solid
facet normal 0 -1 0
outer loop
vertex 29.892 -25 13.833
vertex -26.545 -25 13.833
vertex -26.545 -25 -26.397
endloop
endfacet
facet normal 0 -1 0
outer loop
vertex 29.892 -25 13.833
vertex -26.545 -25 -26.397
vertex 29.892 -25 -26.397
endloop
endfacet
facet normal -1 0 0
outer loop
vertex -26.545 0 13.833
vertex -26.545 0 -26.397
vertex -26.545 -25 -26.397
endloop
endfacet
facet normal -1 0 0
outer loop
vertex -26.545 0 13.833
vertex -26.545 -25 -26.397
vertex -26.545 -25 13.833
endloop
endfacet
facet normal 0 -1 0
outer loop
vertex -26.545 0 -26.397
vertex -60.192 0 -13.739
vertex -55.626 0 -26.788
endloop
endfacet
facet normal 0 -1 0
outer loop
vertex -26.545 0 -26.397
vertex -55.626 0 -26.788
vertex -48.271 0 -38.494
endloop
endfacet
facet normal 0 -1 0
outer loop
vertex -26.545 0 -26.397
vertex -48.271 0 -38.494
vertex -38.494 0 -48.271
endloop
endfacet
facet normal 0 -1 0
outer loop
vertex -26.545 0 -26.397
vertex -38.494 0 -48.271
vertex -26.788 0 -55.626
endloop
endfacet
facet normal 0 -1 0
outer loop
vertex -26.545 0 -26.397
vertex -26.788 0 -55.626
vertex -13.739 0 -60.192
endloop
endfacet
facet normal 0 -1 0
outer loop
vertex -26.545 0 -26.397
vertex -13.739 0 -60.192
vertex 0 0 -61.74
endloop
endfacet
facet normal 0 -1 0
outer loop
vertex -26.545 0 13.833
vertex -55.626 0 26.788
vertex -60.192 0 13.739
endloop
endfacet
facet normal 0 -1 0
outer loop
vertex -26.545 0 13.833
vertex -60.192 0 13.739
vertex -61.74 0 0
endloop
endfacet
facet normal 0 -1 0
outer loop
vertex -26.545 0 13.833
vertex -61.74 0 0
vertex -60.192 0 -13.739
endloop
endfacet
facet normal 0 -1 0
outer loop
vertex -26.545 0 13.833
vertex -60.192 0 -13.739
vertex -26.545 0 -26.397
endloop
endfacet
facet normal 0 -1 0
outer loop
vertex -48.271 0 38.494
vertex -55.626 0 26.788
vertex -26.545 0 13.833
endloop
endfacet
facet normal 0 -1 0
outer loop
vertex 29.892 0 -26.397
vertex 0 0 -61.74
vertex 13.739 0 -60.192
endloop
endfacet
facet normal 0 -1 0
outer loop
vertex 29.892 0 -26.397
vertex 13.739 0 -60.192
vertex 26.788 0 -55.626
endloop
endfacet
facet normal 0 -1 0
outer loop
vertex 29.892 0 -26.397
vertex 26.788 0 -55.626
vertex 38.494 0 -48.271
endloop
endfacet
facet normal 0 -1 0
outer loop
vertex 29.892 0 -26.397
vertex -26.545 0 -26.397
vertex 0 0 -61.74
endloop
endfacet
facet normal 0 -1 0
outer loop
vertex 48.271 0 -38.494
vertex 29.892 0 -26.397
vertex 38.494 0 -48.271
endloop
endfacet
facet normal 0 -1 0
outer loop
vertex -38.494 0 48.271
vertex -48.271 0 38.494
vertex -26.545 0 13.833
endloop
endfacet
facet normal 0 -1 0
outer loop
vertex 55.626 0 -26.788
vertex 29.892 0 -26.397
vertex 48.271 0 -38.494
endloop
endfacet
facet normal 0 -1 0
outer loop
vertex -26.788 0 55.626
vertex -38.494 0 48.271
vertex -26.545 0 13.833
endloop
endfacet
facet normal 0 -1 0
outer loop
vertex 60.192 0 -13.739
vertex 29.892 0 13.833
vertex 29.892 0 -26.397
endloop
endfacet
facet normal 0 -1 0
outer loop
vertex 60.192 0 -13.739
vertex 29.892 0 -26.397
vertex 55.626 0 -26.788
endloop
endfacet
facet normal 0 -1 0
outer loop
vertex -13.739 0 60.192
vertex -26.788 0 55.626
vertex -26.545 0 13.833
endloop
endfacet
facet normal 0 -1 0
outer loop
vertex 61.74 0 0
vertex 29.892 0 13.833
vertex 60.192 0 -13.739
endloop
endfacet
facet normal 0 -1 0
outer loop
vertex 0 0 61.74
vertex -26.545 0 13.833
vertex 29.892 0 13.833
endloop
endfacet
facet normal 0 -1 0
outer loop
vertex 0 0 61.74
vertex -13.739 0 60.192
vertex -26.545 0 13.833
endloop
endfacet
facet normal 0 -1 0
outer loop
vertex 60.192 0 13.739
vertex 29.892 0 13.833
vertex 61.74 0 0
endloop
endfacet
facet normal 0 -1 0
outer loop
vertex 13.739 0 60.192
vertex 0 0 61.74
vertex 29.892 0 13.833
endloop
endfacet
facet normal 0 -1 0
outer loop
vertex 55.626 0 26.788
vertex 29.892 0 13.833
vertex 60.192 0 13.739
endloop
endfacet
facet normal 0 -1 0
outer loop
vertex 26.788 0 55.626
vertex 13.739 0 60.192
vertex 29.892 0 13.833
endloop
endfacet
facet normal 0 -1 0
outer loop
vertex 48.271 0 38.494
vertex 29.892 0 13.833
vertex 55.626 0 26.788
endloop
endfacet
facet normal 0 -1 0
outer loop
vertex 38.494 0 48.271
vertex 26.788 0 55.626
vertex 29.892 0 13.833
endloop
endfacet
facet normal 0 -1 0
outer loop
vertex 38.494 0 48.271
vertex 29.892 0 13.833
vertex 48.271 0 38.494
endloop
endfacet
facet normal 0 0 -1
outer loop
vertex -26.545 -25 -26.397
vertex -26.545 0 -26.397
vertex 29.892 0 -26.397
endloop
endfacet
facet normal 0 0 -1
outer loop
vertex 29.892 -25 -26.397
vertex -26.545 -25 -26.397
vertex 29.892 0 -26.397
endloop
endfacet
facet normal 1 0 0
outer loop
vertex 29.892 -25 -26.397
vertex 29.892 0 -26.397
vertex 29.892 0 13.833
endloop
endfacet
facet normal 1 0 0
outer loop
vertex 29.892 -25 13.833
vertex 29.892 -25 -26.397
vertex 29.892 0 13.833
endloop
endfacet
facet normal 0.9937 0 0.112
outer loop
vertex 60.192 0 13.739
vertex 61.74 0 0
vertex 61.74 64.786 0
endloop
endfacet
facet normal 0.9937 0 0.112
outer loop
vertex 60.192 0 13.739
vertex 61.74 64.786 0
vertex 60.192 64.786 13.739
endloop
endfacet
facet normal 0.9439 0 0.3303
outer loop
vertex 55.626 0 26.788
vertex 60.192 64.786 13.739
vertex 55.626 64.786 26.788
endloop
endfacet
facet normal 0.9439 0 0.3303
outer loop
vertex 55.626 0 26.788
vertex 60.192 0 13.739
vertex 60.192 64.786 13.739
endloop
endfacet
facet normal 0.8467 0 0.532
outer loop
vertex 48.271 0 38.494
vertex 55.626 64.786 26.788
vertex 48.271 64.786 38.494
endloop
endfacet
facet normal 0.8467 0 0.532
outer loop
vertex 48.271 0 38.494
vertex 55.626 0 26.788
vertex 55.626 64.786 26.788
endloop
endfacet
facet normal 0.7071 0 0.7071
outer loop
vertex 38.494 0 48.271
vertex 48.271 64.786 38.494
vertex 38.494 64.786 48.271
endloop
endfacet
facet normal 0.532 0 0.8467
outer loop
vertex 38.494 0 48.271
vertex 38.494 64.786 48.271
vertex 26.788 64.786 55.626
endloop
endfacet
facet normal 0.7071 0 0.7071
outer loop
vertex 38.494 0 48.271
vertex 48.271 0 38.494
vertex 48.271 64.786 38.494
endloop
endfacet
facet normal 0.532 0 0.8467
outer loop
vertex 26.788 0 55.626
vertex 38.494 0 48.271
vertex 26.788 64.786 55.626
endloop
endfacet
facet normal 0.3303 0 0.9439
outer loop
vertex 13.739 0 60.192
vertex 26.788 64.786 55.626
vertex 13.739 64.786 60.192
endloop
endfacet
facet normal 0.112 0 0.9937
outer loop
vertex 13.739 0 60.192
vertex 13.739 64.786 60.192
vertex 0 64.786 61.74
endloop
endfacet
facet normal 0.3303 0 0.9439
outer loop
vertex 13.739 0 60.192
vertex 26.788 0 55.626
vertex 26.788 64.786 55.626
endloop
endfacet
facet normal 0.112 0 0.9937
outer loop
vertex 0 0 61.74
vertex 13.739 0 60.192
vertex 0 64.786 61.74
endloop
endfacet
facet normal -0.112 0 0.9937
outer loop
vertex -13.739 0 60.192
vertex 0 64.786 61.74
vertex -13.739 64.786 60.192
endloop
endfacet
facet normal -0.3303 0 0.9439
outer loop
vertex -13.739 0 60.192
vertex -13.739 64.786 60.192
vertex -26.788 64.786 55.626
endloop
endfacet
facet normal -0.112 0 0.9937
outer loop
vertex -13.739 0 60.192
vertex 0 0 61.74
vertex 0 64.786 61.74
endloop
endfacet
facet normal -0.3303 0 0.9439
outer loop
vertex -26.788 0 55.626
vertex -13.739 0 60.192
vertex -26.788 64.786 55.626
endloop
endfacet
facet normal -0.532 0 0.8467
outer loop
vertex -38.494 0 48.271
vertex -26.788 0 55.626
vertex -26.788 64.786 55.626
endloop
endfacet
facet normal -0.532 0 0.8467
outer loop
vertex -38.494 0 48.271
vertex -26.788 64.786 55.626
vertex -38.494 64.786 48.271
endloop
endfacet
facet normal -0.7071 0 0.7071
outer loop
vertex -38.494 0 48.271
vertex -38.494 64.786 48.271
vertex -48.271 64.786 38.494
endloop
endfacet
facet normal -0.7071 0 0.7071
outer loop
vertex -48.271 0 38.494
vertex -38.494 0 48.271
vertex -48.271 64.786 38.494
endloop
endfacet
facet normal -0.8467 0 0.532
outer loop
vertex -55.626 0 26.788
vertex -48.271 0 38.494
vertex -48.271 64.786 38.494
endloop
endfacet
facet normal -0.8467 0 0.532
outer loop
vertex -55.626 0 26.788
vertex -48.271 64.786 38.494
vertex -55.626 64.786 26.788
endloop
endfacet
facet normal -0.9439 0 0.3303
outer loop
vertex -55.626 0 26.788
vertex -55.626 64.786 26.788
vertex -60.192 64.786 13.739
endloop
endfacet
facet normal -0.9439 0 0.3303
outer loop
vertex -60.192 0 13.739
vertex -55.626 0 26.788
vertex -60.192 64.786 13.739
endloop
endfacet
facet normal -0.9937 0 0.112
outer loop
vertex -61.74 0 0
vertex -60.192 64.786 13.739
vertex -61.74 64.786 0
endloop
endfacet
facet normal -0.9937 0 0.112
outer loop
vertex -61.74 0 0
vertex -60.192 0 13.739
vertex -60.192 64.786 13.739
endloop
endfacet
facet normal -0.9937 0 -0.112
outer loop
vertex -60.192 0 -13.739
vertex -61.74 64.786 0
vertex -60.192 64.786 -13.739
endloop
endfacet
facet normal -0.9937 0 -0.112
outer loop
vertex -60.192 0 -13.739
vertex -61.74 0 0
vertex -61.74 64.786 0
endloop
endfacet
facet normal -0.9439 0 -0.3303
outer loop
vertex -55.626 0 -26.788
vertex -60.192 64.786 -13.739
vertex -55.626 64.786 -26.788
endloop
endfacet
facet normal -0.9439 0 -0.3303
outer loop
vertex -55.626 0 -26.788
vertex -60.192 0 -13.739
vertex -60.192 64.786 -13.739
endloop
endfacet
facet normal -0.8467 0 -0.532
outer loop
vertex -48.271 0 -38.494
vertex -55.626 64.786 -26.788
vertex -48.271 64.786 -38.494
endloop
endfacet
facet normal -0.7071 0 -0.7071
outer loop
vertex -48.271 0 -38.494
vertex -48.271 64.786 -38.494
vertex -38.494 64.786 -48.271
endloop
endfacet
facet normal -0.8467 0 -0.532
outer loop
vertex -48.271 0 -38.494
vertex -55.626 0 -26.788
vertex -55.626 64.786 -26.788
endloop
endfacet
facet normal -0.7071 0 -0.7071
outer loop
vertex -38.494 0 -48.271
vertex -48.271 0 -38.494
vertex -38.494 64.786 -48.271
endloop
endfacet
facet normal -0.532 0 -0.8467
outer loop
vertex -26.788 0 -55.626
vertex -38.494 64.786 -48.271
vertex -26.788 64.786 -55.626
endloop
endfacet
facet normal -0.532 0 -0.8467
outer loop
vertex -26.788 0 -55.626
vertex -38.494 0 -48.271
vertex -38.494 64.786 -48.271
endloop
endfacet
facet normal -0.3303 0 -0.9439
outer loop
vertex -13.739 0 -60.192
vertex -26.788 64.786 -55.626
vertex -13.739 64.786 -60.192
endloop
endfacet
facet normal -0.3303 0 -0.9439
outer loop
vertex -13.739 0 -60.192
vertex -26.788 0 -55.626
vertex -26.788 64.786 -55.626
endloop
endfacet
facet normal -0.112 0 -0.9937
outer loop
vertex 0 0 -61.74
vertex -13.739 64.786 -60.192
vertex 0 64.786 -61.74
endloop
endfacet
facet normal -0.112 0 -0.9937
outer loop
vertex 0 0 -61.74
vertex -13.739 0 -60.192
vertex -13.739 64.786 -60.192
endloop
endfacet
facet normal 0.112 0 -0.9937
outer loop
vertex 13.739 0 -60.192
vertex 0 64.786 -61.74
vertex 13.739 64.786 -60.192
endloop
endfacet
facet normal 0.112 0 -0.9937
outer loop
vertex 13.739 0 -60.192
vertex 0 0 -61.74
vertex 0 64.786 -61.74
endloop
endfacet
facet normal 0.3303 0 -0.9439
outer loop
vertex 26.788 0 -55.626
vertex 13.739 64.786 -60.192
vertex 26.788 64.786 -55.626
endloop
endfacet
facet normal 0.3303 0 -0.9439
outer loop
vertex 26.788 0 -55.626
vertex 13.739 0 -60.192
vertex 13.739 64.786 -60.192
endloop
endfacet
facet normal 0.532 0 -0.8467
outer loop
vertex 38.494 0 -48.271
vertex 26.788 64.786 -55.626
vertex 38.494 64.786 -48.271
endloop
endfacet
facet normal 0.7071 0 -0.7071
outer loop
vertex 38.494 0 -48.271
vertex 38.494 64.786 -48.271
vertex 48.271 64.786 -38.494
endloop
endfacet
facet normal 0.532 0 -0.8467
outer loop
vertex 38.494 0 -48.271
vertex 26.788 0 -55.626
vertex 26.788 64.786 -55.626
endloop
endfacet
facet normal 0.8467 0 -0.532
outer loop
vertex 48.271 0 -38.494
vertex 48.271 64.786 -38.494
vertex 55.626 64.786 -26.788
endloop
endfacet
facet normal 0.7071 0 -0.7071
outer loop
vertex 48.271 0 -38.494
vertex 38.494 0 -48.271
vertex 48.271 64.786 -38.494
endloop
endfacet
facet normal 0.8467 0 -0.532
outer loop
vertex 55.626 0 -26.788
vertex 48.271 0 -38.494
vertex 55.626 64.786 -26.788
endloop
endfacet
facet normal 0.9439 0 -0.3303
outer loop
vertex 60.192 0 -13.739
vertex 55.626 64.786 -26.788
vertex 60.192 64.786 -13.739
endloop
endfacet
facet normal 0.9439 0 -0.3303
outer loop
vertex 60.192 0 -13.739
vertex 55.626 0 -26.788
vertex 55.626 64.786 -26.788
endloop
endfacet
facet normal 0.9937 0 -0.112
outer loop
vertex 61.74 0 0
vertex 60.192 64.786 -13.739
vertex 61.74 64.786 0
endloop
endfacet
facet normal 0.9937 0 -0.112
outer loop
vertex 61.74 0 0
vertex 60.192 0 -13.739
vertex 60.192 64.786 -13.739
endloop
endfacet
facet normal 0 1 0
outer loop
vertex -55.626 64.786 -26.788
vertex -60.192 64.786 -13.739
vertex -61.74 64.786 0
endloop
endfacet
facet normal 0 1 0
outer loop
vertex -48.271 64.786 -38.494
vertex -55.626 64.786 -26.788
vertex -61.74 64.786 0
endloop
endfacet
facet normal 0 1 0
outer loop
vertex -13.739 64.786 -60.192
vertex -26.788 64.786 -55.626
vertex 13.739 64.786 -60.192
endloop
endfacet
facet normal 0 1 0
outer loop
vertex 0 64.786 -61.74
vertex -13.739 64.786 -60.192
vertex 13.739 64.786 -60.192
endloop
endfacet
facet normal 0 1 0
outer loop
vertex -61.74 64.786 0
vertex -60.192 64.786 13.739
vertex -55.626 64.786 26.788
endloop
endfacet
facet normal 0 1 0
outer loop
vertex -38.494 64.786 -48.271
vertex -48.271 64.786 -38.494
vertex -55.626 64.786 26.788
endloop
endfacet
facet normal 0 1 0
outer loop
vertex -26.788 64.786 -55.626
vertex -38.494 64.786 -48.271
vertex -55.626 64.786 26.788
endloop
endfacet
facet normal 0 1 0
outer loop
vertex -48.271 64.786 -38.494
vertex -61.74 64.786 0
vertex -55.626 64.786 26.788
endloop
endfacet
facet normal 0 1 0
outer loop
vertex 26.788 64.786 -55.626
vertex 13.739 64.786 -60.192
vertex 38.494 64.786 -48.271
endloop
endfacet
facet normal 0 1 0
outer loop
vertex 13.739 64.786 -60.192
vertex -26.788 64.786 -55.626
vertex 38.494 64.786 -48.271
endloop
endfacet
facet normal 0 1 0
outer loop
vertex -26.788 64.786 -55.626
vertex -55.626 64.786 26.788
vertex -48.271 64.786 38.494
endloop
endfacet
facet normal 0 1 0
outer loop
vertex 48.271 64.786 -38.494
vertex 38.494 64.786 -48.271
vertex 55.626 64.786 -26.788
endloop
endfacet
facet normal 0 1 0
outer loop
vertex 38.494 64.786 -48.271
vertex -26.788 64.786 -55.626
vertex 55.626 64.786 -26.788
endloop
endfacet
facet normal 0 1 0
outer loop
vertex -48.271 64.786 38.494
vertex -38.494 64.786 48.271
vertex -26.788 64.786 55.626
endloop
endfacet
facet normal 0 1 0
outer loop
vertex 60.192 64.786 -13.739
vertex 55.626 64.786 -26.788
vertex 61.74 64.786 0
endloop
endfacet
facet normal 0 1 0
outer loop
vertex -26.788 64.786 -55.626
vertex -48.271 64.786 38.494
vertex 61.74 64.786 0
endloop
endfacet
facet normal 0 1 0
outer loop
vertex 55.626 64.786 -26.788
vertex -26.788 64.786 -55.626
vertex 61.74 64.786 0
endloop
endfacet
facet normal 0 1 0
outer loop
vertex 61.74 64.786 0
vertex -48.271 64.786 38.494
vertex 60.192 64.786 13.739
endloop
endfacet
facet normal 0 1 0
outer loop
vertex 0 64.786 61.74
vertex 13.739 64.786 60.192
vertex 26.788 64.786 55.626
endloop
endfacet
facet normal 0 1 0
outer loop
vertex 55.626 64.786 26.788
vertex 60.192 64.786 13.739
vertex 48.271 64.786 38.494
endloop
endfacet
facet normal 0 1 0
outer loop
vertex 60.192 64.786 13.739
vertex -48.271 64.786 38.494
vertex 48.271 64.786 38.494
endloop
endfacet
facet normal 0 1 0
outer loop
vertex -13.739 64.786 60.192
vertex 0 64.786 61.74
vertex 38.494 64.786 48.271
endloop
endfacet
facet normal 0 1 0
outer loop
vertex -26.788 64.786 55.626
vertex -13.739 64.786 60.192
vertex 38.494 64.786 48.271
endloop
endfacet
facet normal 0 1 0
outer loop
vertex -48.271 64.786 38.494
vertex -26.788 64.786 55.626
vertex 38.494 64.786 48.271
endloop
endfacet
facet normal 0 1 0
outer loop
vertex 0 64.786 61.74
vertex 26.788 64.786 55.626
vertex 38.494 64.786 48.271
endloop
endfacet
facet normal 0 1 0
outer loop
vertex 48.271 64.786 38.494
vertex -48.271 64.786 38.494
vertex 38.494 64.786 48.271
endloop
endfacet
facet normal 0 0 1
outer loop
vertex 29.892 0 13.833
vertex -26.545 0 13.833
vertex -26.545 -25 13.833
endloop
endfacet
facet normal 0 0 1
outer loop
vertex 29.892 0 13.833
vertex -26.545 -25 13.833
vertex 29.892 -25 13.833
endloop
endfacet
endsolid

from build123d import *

# Parameters (mm, degrees)
F0_W     = 56.436695
F0_H     = 40.230245
F1_DEPTH = 25
F2_R     = 61.740337
F3_DEPTH = 64.786173


with BuildPart() as f1:
    # F0 (on Front) → F1 (new body)
    with BuildSketch(Plane.XZ):
        with Locations((1.673823, -6.281949)):
            Rectangle(F0_W, F0_H)
    extrude(amount=F1_DEPTH)

    # F2 (on Front) → F3 (join)
    with BuildSketch(Plane.XZ):
        Circle(F2_R)
    extrude(amount=-F3_DEPTH)


solid = f1.part
